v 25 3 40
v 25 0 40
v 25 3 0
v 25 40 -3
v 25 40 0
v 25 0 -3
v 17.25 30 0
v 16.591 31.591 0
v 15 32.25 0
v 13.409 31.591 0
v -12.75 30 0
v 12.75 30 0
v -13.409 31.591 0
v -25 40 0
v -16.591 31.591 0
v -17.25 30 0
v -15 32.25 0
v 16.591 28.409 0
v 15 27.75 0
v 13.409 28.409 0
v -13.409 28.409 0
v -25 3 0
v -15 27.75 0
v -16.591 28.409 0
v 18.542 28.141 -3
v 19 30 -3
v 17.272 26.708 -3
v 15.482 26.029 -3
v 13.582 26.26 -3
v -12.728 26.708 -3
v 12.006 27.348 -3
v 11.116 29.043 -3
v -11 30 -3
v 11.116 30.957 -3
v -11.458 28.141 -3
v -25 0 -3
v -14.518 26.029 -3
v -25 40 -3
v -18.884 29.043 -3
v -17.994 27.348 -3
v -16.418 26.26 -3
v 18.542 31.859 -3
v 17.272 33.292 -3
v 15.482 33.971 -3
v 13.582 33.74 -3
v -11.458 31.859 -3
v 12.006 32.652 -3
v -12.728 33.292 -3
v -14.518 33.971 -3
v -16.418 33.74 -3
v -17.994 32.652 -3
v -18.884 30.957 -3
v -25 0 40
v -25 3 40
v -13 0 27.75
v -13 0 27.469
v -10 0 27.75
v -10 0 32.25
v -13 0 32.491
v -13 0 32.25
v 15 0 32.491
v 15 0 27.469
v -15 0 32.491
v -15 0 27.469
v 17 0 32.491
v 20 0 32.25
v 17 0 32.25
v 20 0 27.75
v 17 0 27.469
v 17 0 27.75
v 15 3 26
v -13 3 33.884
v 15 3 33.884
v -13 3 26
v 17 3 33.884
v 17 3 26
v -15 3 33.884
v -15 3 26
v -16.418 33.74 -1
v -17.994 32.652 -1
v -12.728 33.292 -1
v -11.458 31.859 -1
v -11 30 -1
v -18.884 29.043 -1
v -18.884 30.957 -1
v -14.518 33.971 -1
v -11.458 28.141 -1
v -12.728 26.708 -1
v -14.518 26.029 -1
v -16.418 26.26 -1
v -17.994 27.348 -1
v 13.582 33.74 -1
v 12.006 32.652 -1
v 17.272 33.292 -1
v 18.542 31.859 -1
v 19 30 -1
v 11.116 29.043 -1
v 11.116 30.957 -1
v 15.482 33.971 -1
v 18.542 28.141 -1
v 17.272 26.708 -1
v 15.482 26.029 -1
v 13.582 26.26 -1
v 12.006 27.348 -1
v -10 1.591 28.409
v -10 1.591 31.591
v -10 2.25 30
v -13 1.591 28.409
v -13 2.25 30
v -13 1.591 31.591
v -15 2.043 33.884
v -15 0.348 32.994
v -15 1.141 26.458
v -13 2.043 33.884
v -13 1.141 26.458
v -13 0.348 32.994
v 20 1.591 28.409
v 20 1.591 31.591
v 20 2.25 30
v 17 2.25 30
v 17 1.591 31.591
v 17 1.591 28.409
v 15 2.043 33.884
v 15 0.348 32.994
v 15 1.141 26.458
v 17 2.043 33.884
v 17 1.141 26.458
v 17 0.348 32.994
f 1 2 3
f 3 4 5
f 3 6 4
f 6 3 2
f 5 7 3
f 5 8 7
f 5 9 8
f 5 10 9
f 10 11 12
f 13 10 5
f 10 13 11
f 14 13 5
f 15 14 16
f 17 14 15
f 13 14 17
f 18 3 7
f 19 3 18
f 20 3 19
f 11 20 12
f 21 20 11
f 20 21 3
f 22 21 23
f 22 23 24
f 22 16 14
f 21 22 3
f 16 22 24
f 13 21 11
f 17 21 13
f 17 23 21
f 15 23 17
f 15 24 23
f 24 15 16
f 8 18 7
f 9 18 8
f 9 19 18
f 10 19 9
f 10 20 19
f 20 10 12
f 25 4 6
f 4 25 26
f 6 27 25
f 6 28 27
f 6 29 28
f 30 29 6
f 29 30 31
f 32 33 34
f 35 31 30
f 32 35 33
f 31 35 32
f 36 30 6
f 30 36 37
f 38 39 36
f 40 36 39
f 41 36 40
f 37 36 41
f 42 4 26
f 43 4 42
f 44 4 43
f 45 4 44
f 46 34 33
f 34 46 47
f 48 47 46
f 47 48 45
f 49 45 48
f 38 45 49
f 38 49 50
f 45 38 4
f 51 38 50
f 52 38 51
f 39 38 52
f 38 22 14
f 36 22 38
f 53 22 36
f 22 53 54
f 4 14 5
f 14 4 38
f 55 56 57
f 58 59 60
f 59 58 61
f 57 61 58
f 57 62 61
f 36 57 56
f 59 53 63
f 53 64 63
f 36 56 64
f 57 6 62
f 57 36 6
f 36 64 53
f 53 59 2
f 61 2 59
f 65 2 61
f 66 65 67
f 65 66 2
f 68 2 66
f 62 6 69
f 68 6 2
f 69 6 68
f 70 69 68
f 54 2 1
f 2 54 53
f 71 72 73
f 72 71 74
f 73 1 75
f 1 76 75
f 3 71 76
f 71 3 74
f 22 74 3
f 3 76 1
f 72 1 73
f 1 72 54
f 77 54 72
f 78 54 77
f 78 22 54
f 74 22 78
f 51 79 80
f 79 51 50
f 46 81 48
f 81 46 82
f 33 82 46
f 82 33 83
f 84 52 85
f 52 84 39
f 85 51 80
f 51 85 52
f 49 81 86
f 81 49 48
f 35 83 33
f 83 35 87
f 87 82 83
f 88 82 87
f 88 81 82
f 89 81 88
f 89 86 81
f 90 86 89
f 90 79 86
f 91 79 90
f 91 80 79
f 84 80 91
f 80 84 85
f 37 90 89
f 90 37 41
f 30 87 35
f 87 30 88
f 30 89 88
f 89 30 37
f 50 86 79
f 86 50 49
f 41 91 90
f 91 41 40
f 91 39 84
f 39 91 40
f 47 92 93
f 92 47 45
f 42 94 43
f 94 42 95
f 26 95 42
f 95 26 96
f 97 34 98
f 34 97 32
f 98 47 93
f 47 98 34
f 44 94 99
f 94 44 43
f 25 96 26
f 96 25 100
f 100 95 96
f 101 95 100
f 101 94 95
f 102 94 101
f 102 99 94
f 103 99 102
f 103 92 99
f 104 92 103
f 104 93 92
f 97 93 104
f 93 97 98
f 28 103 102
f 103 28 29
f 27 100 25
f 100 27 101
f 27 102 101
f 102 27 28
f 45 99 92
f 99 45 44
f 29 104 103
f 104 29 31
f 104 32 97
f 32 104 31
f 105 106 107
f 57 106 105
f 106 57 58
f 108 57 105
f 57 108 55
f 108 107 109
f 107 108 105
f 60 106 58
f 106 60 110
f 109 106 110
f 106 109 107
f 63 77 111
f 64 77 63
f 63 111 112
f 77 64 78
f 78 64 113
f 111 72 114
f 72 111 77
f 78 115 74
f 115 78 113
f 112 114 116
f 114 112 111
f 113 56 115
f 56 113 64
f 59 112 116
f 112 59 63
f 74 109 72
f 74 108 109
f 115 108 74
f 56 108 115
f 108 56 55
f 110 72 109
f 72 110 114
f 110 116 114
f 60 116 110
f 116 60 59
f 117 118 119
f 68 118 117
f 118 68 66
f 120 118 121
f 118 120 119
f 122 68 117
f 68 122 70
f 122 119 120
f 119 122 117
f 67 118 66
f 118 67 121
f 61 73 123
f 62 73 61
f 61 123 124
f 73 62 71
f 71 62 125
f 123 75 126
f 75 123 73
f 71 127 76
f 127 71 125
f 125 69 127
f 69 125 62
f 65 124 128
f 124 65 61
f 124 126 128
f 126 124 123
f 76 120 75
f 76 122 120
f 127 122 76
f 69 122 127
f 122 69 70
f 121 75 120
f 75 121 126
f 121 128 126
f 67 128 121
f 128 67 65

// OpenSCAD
// Parameters
plate_w   = 50;   // width (X)
plate_d   = 40;   // depth / height (Y or Z)
thickness = 3;    // plate thickness
hole_d    = 4.5;  // through hole
csk_d     = 8;    // countersink diameter
csk_h     = 2;    // countersink depth
edge_off  = 10;   // hole offset from free edge
hole_pos  = 15;   // half pitch in X

// Main model
difference() {
    union() {
        // Horizontal flange (lies in +Y, thickness -Z)
        translate([-plate_w/2, 0, -thickness])
            cube([plate_w, plate_d, thickness]);

        // Vertical flange (lies in +Z, thickness +Y)
        translate([-plate_w/2, 0, 0])
            cube([plate_w, thickness, plate_d]);
    }

    // Horizontal holes & countersinks (axis Z)
    for (x = [-hole_pos, hole_pos]) {
        translate([x, plate_d - edge_off, 0]) {
            // through hole
            cylinder(d = hole_d, h = thickness + 2, center = false);
            // countersink (outer side, bottom)
            translate([0, 0, -thickness])
                cylinder(d = csk_d, h = csk_h, center = false);
        }
    }

    // Vertical holes & countersinks (axis Y)
    for (x = [-hole_pos, hole_pos]) {
        translate([x, 0, plate_d - edge_off]) {
            // through hole
            rotate([0, 90, 0])
                cylinder(d = hole_d, h = thickness + 2, center = false);
            // countersink (outer side, +Y)
            translate([0, thickness, 0])
                rotate([0, 90, 0])
                    cylinder(d = csk_d, h = csk_h, center = false);
        }
    }
}
